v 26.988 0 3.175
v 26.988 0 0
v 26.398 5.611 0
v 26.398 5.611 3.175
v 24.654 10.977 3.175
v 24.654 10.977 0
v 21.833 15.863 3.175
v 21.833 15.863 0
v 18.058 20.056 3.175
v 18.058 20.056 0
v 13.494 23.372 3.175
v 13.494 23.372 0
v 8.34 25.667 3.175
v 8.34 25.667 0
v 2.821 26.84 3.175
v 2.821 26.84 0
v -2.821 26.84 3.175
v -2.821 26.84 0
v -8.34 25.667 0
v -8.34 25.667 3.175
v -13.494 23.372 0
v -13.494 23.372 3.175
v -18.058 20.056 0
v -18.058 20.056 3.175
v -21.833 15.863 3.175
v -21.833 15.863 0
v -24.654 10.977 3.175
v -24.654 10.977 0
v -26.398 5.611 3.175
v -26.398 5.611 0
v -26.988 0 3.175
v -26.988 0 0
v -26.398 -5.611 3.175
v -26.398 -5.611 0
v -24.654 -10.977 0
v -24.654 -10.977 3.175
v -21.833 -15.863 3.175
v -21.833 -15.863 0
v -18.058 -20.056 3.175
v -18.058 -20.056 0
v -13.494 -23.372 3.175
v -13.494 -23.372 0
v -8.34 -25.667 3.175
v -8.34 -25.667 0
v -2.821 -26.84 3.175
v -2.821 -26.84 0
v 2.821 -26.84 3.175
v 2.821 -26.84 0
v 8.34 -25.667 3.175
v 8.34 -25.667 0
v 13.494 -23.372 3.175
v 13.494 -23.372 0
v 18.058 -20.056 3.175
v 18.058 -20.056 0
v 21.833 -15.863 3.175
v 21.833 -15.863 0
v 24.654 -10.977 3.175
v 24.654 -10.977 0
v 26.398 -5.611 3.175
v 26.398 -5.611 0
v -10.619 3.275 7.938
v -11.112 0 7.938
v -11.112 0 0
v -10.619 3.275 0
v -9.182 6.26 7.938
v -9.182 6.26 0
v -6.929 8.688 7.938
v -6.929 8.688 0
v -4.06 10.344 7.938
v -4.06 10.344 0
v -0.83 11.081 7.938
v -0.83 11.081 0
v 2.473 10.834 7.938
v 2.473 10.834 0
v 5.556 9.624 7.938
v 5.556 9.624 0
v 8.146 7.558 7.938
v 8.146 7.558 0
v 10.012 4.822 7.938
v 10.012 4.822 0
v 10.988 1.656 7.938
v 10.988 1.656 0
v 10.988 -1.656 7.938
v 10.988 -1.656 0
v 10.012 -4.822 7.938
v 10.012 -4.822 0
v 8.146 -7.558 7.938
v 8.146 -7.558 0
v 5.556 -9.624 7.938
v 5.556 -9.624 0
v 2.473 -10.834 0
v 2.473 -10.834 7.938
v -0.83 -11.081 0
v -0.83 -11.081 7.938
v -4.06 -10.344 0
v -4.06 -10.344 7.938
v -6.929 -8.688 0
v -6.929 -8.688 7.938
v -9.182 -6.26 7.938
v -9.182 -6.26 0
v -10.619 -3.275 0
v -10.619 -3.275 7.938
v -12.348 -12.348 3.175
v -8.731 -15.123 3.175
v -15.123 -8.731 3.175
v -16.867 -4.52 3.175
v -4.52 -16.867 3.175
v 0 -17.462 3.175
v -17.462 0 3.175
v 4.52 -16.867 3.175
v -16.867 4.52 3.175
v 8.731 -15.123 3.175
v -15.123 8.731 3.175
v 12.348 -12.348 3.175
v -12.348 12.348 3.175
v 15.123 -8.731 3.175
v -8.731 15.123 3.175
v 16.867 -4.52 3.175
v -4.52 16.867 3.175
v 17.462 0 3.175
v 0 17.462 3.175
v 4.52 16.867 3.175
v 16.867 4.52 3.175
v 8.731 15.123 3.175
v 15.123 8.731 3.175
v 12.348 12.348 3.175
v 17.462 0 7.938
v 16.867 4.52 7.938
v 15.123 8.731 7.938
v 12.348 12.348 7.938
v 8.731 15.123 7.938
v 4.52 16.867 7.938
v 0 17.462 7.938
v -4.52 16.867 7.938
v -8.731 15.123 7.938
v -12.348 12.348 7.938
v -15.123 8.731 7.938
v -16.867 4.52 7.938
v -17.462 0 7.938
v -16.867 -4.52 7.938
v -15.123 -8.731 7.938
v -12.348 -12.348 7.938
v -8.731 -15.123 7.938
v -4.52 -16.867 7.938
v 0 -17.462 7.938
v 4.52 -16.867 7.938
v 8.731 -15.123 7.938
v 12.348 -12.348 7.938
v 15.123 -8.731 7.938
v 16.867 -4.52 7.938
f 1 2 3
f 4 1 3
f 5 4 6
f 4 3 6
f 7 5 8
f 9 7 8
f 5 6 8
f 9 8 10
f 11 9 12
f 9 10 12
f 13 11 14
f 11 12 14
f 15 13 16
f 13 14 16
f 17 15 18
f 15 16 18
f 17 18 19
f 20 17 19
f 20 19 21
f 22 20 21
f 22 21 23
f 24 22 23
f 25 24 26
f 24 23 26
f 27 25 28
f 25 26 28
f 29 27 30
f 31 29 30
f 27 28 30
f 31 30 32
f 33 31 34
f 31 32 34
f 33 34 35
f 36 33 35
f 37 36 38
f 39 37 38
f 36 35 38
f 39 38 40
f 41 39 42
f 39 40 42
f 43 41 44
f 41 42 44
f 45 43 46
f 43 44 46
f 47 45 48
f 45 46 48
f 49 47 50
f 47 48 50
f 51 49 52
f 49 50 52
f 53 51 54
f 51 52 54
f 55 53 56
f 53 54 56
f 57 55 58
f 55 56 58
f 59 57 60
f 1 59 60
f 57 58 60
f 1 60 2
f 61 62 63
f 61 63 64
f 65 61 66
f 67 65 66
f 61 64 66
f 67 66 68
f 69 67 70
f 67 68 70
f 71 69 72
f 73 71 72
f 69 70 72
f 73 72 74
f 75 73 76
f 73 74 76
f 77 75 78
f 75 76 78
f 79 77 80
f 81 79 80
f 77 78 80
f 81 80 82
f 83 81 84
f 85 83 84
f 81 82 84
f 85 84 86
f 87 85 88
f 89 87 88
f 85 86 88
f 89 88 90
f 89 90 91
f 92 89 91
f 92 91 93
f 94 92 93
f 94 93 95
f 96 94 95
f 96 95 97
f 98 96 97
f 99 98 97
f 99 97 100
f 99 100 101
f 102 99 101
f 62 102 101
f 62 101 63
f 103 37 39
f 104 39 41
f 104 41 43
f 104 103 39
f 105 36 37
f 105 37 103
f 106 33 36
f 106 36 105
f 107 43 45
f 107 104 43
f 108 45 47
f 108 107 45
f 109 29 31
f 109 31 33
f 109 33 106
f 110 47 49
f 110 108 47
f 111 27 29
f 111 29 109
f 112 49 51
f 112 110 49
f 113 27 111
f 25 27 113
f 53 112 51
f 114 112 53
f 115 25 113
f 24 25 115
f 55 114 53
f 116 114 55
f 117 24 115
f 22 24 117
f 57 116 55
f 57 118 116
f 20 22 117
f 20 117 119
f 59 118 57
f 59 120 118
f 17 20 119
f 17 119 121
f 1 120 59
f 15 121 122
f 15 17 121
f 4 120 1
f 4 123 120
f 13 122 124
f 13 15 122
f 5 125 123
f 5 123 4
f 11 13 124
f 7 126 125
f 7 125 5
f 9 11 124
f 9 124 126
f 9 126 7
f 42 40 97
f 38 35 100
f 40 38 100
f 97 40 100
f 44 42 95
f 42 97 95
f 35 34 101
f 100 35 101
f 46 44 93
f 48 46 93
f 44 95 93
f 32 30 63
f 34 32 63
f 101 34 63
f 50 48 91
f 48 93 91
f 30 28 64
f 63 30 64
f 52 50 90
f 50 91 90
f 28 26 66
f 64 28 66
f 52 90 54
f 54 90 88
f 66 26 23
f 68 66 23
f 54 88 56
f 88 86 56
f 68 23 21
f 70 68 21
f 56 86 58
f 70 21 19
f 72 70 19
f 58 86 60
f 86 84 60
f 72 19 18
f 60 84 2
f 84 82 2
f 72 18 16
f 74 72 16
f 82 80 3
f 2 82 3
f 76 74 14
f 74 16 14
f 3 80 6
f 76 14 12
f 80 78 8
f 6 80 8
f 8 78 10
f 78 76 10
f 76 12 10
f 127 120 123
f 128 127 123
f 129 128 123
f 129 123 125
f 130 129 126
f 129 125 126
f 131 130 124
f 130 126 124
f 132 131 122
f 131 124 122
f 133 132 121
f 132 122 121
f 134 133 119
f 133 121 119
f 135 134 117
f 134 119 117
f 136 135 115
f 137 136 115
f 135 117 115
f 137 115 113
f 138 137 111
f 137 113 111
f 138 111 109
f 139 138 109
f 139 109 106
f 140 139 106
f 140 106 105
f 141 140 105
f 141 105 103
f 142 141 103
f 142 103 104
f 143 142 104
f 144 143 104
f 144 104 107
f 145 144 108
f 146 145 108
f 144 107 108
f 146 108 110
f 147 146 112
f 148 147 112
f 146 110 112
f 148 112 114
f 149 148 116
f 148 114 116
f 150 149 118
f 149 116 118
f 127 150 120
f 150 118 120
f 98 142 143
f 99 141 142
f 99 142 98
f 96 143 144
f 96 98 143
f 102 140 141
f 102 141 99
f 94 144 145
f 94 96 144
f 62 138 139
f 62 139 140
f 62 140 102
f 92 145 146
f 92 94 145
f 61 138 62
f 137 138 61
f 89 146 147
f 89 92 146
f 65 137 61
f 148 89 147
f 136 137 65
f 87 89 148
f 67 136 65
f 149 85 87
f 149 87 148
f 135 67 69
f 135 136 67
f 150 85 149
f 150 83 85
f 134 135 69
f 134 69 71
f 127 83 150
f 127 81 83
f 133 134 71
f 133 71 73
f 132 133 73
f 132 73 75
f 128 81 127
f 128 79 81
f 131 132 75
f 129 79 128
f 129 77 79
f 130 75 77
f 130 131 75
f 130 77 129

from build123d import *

# Parameters (mm, degrees)
F0_R     = 26.9875
F1_DEPTH = 3.175
F2_R     = 17.4625
F3_DEPTH = 4.7625
F5_D     = 22.225


with BuildPart() as f1:
    # F0 (on Top) → F1 (new body)
    with BuildSketch(Plane.XY):
        Circle(F0_R)
    extrude(amount=F1_DEPTH)

    # F2 (on face) → F3 (join)
    with BuildSketch(Plane.XY.offset(3.175)):
        Circle(F2_R)
    extrude(amount=F3_DEPTH)

    # F5 (through all)
    with Locations(Plane.XY.offset(7.9375)):
        with Locations((0, 0)):
            Hole(F5_D / 2)


solid = f1.part
